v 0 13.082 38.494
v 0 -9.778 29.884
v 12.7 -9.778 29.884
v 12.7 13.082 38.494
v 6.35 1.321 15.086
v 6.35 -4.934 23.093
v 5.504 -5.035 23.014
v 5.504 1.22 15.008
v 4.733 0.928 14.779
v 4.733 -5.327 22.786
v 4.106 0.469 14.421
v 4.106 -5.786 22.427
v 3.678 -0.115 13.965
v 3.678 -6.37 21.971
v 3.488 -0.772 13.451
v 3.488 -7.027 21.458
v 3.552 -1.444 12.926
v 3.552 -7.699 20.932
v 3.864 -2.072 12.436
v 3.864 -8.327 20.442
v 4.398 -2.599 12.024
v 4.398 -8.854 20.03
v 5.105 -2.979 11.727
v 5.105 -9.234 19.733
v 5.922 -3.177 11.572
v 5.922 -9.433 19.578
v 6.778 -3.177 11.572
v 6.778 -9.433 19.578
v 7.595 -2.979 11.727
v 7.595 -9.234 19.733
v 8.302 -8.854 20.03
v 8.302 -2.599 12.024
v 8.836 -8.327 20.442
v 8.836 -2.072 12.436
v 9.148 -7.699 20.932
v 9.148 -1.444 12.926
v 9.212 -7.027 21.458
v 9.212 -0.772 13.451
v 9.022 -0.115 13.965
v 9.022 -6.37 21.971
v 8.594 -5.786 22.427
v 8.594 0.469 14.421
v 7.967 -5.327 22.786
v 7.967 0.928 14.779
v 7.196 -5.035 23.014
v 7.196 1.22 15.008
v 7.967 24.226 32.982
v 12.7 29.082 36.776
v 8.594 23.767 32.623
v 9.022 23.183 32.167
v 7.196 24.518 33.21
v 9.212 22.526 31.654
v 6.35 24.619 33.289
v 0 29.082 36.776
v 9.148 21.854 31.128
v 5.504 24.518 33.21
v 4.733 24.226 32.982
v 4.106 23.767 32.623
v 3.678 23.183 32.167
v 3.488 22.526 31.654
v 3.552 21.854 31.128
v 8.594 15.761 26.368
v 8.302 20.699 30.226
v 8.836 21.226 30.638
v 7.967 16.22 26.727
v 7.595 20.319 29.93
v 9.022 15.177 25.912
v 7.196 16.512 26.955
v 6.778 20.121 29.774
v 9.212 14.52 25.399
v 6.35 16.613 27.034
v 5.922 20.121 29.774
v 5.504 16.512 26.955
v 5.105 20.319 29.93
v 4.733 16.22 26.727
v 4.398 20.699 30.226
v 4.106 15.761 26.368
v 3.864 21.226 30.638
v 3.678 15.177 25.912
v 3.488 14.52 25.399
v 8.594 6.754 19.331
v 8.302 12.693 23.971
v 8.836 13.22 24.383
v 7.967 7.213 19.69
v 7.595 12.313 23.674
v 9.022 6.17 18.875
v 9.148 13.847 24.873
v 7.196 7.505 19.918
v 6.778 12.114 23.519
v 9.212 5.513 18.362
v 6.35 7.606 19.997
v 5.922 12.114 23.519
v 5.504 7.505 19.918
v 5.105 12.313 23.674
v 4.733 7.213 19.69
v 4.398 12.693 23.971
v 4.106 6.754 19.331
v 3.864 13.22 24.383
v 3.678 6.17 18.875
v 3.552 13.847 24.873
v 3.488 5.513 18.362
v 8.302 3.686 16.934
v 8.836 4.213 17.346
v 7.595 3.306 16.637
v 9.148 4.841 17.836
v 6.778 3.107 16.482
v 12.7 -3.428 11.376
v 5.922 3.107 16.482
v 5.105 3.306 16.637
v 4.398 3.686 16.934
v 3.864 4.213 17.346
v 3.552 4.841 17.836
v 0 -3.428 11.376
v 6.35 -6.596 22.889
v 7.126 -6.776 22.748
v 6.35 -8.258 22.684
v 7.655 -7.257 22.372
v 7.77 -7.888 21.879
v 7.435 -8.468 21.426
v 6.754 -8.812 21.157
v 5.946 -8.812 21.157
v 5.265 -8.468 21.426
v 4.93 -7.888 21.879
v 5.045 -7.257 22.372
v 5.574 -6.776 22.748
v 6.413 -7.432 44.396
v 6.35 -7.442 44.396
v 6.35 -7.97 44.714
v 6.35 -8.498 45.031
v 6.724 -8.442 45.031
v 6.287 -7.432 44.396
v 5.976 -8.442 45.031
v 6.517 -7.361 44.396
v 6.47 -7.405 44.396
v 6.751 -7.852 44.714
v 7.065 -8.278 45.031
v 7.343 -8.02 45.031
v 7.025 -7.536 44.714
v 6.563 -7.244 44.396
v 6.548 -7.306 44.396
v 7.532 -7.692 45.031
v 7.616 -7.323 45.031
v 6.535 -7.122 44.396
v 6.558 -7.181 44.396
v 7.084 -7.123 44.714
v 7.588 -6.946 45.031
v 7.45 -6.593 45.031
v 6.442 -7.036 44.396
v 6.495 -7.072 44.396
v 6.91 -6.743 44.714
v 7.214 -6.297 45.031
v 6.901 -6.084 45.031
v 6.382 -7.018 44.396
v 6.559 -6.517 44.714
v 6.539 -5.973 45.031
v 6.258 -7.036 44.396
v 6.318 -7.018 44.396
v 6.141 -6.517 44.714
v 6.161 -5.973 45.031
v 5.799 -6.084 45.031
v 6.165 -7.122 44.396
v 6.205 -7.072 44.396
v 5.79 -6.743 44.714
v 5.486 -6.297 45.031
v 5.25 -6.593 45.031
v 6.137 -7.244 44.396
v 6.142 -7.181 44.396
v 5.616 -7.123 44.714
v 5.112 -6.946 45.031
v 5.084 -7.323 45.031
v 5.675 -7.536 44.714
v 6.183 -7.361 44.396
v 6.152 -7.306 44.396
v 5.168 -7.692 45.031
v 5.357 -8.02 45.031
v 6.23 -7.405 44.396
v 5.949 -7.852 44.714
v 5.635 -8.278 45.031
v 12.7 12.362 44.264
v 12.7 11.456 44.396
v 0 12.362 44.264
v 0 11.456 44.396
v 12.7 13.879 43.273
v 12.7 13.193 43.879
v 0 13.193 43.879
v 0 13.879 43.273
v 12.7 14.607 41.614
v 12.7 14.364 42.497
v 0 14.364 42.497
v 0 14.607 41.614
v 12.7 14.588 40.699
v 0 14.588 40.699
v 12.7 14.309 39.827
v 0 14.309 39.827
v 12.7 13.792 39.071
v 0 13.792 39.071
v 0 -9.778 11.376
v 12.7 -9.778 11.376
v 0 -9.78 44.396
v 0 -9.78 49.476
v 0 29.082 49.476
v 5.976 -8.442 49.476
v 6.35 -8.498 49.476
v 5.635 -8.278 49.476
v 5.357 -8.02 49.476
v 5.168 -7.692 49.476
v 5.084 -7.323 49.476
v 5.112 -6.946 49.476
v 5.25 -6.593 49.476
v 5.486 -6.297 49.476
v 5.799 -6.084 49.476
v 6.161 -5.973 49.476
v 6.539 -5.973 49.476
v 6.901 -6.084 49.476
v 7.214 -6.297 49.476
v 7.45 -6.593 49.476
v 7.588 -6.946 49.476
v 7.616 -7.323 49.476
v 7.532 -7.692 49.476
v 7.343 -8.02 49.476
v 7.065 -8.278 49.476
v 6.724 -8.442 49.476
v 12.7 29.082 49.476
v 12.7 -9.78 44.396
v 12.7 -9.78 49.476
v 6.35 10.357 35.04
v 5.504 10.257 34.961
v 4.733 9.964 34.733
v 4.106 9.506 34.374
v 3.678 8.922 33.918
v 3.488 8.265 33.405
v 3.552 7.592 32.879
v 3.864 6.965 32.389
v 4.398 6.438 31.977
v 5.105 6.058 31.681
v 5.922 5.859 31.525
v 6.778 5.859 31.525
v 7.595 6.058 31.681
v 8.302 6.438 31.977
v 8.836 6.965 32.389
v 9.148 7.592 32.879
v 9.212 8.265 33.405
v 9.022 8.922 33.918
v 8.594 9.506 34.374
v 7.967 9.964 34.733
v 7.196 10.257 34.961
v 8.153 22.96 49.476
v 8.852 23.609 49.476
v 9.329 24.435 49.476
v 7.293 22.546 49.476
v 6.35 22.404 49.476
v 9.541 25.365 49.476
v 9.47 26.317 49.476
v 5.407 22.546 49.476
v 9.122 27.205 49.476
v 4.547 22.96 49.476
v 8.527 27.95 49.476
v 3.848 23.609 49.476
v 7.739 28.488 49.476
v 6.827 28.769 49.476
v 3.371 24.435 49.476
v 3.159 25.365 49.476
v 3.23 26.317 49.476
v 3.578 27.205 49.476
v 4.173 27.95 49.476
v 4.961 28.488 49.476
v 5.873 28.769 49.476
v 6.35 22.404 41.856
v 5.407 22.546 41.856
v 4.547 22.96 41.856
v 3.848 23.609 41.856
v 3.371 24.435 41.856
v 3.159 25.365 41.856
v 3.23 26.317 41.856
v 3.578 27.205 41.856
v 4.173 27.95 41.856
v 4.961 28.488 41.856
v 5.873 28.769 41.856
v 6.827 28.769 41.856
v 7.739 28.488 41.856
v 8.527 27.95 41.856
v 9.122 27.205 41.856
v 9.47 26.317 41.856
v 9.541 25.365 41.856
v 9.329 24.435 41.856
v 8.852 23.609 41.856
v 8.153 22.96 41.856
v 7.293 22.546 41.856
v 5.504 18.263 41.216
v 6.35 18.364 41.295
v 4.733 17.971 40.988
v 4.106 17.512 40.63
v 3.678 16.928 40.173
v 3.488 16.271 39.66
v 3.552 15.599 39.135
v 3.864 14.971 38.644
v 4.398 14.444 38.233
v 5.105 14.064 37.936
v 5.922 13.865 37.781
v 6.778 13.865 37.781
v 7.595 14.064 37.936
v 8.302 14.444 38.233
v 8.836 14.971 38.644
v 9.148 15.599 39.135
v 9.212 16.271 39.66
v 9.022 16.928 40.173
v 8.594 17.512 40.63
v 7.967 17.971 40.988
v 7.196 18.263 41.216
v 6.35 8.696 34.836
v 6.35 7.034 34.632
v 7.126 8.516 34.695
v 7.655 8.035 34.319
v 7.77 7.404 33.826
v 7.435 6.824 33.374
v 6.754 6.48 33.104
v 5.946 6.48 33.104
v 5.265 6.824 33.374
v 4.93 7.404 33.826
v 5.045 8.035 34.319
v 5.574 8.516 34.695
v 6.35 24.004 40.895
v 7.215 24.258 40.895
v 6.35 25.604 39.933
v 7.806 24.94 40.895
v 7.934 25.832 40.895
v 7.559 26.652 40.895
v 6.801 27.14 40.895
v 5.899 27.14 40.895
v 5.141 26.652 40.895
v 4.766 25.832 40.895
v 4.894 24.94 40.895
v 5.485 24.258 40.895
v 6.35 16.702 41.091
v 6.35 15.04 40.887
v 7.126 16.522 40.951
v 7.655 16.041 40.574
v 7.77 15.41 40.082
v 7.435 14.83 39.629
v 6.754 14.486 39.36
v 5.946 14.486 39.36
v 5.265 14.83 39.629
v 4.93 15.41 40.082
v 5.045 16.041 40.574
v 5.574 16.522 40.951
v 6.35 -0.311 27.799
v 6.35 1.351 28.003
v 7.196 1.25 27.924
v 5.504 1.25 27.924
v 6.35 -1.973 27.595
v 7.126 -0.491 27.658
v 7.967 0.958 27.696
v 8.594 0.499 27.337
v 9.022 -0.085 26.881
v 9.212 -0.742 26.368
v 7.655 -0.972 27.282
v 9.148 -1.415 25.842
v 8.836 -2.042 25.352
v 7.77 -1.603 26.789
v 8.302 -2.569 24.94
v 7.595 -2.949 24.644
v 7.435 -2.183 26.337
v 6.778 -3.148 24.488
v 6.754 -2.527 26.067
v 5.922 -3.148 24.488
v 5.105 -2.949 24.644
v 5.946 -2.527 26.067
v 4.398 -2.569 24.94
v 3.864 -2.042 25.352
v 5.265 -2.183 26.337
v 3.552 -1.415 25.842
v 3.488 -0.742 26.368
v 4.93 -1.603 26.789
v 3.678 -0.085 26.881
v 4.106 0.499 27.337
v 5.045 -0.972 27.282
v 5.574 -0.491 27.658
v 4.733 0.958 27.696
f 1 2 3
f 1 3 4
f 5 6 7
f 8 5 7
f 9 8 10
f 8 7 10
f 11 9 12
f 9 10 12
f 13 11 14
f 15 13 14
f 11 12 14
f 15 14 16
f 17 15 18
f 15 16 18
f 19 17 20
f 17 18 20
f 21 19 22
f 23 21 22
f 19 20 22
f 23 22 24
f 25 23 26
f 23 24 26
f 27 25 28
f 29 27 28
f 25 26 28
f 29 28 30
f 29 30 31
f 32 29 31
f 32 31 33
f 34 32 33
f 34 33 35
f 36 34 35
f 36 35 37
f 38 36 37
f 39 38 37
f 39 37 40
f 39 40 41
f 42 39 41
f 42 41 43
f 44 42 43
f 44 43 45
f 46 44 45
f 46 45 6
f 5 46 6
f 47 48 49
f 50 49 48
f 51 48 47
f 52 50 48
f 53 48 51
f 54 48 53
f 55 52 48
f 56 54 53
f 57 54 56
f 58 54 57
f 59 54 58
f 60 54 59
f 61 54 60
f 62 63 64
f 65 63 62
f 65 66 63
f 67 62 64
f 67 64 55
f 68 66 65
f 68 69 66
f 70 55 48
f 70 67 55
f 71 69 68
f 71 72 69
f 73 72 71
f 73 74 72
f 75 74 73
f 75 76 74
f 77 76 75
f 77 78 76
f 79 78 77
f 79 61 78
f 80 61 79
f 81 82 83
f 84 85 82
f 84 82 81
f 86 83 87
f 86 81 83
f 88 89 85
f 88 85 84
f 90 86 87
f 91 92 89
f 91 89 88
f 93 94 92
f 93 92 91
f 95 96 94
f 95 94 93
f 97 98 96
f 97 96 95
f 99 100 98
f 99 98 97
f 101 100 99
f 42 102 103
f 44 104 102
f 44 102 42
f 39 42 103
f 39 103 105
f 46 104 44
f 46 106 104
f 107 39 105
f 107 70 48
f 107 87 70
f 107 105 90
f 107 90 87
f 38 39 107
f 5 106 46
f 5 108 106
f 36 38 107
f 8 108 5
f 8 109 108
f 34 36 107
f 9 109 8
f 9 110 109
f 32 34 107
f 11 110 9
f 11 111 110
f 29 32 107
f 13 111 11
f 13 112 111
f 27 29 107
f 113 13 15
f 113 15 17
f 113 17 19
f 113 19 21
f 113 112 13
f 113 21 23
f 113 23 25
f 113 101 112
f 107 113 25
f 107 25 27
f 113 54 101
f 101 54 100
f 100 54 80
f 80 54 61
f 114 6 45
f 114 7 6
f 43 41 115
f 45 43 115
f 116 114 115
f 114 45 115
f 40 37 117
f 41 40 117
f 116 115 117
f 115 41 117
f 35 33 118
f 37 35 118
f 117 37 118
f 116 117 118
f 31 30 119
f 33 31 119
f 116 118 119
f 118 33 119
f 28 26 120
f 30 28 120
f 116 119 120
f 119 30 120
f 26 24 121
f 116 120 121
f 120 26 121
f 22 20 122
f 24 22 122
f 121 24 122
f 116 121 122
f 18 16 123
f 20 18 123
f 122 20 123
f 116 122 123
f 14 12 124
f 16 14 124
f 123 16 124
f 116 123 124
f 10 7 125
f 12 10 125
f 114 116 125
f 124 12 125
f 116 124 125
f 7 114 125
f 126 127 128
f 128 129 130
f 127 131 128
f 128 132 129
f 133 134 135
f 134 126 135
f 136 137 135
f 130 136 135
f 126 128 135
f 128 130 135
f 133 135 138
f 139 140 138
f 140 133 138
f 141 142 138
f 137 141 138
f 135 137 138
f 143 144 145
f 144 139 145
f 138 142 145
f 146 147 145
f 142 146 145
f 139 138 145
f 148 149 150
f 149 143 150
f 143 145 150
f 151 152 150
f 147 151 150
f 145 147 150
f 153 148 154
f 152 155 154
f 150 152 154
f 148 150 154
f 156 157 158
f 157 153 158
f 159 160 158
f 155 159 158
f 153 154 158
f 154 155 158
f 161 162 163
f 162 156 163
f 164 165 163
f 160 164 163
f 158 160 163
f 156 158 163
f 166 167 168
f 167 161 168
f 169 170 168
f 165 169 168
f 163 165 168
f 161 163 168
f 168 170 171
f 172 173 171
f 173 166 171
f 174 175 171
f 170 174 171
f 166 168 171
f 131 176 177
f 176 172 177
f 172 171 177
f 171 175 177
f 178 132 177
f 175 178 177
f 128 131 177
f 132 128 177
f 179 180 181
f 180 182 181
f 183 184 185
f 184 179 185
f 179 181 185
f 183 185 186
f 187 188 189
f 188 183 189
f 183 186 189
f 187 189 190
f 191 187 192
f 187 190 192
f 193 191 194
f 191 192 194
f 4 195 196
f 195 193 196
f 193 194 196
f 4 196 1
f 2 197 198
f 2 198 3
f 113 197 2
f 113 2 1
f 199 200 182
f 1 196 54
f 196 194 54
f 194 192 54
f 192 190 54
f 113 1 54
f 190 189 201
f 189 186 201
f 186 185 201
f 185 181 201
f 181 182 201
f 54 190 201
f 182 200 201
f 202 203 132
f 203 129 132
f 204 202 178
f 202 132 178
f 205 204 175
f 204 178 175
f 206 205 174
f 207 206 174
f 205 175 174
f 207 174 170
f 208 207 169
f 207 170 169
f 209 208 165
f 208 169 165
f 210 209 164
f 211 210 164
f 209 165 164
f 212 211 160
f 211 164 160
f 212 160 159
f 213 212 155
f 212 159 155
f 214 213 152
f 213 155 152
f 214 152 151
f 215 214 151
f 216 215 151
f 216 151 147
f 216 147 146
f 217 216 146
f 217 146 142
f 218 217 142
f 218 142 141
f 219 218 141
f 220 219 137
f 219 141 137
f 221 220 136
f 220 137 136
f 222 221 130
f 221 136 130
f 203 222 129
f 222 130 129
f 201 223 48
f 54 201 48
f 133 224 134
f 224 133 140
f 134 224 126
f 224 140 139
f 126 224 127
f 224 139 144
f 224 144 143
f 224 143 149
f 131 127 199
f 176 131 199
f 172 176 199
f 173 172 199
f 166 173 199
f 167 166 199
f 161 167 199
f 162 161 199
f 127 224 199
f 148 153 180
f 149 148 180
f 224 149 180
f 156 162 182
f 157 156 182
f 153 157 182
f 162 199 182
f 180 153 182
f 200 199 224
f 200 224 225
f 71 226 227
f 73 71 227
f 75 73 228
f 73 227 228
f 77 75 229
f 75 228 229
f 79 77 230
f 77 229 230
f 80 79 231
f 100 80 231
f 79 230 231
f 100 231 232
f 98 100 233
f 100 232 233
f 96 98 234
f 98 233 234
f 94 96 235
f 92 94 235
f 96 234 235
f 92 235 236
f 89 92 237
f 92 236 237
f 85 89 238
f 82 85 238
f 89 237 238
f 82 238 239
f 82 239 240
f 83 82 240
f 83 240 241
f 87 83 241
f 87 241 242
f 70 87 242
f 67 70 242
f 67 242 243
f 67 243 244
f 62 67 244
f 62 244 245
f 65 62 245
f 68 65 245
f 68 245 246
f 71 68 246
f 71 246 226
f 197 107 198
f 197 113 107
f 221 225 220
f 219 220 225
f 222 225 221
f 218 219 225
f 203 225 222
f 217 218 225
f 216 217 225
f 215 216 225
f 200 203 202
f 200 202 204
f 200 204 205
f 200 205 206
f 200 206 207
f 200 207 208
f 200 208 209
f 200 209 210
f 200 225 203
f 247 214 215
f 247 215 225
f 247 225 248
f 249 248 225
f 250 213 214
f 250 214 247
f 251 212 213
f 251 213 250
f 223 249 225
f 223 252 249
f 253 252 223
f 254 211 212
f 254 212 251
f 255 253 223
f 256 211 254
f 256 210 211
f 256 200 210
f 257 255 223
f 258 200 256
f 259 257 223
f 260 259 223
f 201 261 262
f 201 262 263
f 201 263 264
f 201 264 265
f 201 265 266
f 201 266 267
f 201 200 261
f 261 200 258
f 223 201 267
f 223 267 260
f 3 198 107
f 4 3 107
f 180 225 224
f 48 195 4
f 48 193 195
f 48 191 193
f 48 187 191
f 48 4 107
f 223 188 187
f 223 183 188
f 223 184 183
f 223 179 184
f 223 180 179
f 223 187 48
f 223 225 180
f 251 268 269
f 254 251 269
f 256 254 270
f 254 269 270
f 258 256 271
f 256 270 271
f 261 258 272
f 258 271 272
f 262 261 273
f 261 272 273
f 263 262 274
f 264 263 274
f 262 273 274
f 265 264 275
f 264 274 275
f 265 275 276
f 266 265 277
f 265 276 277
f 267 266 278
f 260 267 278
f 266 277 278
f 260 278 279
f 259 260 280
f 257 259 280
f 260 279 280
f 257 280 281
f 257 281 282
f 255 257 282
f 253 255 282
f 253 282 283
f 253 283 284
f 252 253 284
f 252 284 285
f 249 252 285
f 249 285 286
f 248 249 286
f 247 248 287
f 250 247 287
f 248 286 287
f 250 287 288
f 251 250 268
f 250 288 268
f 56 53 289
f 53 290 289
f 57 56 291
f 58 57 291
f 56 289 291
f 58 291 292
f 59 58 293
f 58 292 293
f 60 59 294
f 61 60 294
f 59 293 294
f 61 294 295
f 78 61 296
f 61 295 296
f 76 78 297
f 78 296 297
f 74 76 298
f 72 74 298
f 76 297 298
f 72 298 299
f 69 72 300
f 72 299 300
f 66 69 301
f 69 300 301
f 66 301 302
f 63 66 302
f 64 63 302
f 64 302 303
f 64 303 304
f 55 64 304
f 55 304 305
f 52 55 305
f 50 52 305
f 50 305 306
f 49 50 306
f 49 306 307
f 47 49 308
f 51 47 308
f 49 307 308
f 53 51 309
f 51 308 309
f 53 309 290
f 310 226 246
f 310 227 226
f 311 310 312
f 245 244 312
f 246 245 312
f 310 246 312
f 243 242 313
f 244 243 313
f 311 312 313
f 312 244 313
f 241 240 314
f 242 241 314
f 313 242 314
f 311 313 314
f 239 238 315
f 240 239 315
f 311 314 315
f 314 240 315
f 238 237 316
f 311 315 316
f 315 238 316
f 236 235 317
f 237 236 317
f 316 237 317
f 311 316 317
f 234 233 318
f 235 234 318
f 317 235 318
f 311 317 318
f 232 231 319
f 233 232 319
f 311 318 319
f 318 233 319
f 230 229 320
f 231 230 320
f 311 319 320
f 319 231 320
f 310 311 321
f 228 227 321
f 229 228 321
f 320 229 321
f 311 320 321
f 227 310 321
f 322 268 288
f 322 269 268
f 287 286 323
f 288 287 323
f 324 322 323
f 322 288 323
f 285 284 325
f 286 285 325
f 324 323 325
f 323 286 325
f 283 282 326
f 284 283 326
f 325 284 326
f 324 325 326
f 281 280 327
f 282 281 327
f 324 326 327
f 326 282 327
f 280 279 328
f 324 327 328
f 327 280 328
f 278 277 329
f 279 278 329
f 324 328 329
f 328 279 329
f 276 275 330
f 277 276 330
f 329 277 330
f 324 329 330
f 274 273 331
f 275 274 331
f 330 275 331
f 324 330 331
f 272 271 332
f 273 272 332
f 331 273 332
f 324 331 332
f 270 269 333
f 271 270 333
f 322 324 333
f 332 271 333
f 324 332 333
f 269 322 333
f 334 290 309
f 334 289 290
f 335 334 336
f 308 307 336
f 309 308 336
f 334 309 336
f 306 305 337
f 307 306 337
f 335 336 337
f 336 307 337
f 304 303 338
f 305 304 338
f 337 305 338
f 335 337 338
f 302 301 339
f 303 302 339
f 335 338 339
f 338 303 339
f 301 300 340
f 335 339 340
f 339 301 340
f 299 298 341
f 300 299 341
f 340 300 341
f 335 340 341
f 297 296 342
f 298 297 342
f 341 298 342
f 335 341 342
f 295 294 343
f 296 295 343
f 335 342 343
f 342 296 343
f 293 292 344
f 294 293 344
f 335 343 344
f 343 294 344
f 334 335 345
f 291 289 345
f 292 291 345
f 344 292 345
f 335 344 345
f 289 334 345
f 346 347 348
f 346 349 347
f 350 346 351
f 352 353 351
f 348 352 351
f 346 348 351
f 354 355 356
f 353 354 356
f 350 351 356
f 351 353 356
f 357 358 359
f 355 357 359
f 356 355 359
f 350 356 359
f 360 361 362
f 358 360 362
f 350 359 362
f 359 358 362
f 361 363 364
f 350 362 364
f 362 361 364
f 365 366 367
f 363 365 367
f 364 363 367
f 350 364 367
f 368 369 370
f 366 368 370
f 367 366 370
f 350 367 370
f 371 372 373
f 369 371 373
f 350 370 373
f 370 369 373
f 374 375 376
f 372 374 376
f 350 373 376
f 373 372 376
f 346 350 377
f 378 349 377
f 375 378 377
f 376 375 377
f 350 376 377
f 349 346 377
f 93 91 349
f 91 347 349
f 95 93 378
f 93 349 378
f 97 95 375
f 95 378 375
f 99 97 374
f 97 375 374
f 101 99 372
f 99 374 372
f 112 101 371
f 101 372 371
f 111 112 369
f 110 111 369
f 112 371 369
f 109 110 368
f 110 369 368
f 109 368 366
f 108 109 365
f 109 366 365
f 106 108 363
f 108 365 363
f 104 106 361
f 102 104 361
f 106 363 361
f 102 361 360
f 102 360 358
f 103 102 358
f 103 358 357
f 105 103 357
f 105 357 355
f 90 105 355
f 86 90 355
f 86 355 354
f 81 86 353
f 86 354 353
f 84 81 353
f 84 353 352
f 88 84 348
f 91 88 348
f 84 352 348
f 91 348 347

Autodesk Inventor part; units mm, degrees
ref_plane "YZ Plane" through (0, 0, 0) normal (1, 0, 0) x (0, 1, 0)
ref_plane "XZ Plane" through (0, 0, 0) normal (0, 1, 0) x (-1, 0, 0)
ref_plane "XY Plane" through (0, 0, 0) normal (0, 0, 1) x (1, 0, 0)
sketch "Sketch1" plane through (0, 0, 0) normal (1, 0, 0) x (0, 1, 0)
  point P0 (0, 0)
sketch "Sketch2" plane through (0, 0, 0) normal (1, 0, 0) x (0, 1, 0)
  line L0 (29.0822, 42.9634) -> (29.0822, 36.776)
  line L1 (29.0822, 36.776) -> (-3.4283, 11.376)
  line L2 (-3.4283, 11.376) -> (-9.7783, 11.376)
  line L3 (-9.7783, 11.376) -> (-9.7783, 29.8843)
  line L4 (-9.7783, 29.8843) -> (13.0817, 38.4937)
  line L5 (10.2262, 44.396) -> (-9.7798, 44.396)
  line L6 (-9.7798, 44.396) -> (-9.7798, 49.476)
  line L7 (-9.7798, 49.476) -> (29.0822, 49.476)
  line L8 (29.0822, 49.476) -> (29.0822, 42.9634)
  line L9 (10.2262, 44.396) -> (11.4561, 44.396)
  arc A0 (13.0817, 38.4937) -> (11.4561, 44.396) centre (11.4561, 41.221) ccw
  point P0 (0, 0)
  dimension "d0" = 5.08
  dimension "d1" = 6.35
  dimension "d2" = 38.1
  dimension "d3" = 38
  dimension "d4" = 3.175
  dimension "d5" = 21.2344
  dimension "d6" = 12.7
  dimension "d7" = 38.862
  dimension "d9" = 22.86
extrude "Extrusion1" add sketch "Sketch2" along normal blind 12.7
sketch "Sketch4" plane through (0, -9.7798, 49.476) normal (0, 0, 1) x (1, 0, 0)
  point P0 (0, 9.7798)
  point P1 (6.35, 35.3841)
hole "Hole1" at (6.35, 25.6044, 49.476) direction (0, 0, -1) diameter 6.4008 depth 7.62 tip angle 118 thread size "5/16-18 UNC" class "2B" standard "ANSI Unified Screw Threads"
sketch "Sketch5" plane through (0, -9.7798, 49.476) normal (0, 0, 1) x (1, 0, 0)
  point P0 (0, 9.7798)
  point P1 (6.35, 2.5513)
hole "Hole2" at (6.35, -7.2284, 49.476) direction (0, 0, -1) diameter 2.54 depth 4.445 tip angle 118
sketch "Sketch6" plane through (12.7, 29.0822, 36.776) normal (0, 0.6157, -0.788) x (-1, 0, 0)
  line L0 (12.7, -46.2603) -> (0, -46.2603) construction
  line L1 (6.35, -46.2603) -> (6.35, -0.205) construction
  line L2 (12.7, 0) -> (0, 0) construction
  point P0 (12.7, -45.5586)
  point P1 (6.35, -8.5344)
  point P2 (6.35, -18.6944)
  point P3 (6.35, -30.1244)
  point P4 (6.35, -38.1)
  dimension "d26" = 8.5344
  dimension "d27" = 18.6944
  dimension "d28" = 30.1244
  dimension "d29" = 38.1
hole "Hole3" at (6.35, 22.357, 31.5217) at (6.35, 14.3508, 25.2665) at (6.35, 5.3439, 18.2295) at (6.35, -0.941, 13.3193) direction (0, -0.6157, 0.788) diameter 5.7404 depth 10.16 tip angle 118
properties part number "Hole part"
